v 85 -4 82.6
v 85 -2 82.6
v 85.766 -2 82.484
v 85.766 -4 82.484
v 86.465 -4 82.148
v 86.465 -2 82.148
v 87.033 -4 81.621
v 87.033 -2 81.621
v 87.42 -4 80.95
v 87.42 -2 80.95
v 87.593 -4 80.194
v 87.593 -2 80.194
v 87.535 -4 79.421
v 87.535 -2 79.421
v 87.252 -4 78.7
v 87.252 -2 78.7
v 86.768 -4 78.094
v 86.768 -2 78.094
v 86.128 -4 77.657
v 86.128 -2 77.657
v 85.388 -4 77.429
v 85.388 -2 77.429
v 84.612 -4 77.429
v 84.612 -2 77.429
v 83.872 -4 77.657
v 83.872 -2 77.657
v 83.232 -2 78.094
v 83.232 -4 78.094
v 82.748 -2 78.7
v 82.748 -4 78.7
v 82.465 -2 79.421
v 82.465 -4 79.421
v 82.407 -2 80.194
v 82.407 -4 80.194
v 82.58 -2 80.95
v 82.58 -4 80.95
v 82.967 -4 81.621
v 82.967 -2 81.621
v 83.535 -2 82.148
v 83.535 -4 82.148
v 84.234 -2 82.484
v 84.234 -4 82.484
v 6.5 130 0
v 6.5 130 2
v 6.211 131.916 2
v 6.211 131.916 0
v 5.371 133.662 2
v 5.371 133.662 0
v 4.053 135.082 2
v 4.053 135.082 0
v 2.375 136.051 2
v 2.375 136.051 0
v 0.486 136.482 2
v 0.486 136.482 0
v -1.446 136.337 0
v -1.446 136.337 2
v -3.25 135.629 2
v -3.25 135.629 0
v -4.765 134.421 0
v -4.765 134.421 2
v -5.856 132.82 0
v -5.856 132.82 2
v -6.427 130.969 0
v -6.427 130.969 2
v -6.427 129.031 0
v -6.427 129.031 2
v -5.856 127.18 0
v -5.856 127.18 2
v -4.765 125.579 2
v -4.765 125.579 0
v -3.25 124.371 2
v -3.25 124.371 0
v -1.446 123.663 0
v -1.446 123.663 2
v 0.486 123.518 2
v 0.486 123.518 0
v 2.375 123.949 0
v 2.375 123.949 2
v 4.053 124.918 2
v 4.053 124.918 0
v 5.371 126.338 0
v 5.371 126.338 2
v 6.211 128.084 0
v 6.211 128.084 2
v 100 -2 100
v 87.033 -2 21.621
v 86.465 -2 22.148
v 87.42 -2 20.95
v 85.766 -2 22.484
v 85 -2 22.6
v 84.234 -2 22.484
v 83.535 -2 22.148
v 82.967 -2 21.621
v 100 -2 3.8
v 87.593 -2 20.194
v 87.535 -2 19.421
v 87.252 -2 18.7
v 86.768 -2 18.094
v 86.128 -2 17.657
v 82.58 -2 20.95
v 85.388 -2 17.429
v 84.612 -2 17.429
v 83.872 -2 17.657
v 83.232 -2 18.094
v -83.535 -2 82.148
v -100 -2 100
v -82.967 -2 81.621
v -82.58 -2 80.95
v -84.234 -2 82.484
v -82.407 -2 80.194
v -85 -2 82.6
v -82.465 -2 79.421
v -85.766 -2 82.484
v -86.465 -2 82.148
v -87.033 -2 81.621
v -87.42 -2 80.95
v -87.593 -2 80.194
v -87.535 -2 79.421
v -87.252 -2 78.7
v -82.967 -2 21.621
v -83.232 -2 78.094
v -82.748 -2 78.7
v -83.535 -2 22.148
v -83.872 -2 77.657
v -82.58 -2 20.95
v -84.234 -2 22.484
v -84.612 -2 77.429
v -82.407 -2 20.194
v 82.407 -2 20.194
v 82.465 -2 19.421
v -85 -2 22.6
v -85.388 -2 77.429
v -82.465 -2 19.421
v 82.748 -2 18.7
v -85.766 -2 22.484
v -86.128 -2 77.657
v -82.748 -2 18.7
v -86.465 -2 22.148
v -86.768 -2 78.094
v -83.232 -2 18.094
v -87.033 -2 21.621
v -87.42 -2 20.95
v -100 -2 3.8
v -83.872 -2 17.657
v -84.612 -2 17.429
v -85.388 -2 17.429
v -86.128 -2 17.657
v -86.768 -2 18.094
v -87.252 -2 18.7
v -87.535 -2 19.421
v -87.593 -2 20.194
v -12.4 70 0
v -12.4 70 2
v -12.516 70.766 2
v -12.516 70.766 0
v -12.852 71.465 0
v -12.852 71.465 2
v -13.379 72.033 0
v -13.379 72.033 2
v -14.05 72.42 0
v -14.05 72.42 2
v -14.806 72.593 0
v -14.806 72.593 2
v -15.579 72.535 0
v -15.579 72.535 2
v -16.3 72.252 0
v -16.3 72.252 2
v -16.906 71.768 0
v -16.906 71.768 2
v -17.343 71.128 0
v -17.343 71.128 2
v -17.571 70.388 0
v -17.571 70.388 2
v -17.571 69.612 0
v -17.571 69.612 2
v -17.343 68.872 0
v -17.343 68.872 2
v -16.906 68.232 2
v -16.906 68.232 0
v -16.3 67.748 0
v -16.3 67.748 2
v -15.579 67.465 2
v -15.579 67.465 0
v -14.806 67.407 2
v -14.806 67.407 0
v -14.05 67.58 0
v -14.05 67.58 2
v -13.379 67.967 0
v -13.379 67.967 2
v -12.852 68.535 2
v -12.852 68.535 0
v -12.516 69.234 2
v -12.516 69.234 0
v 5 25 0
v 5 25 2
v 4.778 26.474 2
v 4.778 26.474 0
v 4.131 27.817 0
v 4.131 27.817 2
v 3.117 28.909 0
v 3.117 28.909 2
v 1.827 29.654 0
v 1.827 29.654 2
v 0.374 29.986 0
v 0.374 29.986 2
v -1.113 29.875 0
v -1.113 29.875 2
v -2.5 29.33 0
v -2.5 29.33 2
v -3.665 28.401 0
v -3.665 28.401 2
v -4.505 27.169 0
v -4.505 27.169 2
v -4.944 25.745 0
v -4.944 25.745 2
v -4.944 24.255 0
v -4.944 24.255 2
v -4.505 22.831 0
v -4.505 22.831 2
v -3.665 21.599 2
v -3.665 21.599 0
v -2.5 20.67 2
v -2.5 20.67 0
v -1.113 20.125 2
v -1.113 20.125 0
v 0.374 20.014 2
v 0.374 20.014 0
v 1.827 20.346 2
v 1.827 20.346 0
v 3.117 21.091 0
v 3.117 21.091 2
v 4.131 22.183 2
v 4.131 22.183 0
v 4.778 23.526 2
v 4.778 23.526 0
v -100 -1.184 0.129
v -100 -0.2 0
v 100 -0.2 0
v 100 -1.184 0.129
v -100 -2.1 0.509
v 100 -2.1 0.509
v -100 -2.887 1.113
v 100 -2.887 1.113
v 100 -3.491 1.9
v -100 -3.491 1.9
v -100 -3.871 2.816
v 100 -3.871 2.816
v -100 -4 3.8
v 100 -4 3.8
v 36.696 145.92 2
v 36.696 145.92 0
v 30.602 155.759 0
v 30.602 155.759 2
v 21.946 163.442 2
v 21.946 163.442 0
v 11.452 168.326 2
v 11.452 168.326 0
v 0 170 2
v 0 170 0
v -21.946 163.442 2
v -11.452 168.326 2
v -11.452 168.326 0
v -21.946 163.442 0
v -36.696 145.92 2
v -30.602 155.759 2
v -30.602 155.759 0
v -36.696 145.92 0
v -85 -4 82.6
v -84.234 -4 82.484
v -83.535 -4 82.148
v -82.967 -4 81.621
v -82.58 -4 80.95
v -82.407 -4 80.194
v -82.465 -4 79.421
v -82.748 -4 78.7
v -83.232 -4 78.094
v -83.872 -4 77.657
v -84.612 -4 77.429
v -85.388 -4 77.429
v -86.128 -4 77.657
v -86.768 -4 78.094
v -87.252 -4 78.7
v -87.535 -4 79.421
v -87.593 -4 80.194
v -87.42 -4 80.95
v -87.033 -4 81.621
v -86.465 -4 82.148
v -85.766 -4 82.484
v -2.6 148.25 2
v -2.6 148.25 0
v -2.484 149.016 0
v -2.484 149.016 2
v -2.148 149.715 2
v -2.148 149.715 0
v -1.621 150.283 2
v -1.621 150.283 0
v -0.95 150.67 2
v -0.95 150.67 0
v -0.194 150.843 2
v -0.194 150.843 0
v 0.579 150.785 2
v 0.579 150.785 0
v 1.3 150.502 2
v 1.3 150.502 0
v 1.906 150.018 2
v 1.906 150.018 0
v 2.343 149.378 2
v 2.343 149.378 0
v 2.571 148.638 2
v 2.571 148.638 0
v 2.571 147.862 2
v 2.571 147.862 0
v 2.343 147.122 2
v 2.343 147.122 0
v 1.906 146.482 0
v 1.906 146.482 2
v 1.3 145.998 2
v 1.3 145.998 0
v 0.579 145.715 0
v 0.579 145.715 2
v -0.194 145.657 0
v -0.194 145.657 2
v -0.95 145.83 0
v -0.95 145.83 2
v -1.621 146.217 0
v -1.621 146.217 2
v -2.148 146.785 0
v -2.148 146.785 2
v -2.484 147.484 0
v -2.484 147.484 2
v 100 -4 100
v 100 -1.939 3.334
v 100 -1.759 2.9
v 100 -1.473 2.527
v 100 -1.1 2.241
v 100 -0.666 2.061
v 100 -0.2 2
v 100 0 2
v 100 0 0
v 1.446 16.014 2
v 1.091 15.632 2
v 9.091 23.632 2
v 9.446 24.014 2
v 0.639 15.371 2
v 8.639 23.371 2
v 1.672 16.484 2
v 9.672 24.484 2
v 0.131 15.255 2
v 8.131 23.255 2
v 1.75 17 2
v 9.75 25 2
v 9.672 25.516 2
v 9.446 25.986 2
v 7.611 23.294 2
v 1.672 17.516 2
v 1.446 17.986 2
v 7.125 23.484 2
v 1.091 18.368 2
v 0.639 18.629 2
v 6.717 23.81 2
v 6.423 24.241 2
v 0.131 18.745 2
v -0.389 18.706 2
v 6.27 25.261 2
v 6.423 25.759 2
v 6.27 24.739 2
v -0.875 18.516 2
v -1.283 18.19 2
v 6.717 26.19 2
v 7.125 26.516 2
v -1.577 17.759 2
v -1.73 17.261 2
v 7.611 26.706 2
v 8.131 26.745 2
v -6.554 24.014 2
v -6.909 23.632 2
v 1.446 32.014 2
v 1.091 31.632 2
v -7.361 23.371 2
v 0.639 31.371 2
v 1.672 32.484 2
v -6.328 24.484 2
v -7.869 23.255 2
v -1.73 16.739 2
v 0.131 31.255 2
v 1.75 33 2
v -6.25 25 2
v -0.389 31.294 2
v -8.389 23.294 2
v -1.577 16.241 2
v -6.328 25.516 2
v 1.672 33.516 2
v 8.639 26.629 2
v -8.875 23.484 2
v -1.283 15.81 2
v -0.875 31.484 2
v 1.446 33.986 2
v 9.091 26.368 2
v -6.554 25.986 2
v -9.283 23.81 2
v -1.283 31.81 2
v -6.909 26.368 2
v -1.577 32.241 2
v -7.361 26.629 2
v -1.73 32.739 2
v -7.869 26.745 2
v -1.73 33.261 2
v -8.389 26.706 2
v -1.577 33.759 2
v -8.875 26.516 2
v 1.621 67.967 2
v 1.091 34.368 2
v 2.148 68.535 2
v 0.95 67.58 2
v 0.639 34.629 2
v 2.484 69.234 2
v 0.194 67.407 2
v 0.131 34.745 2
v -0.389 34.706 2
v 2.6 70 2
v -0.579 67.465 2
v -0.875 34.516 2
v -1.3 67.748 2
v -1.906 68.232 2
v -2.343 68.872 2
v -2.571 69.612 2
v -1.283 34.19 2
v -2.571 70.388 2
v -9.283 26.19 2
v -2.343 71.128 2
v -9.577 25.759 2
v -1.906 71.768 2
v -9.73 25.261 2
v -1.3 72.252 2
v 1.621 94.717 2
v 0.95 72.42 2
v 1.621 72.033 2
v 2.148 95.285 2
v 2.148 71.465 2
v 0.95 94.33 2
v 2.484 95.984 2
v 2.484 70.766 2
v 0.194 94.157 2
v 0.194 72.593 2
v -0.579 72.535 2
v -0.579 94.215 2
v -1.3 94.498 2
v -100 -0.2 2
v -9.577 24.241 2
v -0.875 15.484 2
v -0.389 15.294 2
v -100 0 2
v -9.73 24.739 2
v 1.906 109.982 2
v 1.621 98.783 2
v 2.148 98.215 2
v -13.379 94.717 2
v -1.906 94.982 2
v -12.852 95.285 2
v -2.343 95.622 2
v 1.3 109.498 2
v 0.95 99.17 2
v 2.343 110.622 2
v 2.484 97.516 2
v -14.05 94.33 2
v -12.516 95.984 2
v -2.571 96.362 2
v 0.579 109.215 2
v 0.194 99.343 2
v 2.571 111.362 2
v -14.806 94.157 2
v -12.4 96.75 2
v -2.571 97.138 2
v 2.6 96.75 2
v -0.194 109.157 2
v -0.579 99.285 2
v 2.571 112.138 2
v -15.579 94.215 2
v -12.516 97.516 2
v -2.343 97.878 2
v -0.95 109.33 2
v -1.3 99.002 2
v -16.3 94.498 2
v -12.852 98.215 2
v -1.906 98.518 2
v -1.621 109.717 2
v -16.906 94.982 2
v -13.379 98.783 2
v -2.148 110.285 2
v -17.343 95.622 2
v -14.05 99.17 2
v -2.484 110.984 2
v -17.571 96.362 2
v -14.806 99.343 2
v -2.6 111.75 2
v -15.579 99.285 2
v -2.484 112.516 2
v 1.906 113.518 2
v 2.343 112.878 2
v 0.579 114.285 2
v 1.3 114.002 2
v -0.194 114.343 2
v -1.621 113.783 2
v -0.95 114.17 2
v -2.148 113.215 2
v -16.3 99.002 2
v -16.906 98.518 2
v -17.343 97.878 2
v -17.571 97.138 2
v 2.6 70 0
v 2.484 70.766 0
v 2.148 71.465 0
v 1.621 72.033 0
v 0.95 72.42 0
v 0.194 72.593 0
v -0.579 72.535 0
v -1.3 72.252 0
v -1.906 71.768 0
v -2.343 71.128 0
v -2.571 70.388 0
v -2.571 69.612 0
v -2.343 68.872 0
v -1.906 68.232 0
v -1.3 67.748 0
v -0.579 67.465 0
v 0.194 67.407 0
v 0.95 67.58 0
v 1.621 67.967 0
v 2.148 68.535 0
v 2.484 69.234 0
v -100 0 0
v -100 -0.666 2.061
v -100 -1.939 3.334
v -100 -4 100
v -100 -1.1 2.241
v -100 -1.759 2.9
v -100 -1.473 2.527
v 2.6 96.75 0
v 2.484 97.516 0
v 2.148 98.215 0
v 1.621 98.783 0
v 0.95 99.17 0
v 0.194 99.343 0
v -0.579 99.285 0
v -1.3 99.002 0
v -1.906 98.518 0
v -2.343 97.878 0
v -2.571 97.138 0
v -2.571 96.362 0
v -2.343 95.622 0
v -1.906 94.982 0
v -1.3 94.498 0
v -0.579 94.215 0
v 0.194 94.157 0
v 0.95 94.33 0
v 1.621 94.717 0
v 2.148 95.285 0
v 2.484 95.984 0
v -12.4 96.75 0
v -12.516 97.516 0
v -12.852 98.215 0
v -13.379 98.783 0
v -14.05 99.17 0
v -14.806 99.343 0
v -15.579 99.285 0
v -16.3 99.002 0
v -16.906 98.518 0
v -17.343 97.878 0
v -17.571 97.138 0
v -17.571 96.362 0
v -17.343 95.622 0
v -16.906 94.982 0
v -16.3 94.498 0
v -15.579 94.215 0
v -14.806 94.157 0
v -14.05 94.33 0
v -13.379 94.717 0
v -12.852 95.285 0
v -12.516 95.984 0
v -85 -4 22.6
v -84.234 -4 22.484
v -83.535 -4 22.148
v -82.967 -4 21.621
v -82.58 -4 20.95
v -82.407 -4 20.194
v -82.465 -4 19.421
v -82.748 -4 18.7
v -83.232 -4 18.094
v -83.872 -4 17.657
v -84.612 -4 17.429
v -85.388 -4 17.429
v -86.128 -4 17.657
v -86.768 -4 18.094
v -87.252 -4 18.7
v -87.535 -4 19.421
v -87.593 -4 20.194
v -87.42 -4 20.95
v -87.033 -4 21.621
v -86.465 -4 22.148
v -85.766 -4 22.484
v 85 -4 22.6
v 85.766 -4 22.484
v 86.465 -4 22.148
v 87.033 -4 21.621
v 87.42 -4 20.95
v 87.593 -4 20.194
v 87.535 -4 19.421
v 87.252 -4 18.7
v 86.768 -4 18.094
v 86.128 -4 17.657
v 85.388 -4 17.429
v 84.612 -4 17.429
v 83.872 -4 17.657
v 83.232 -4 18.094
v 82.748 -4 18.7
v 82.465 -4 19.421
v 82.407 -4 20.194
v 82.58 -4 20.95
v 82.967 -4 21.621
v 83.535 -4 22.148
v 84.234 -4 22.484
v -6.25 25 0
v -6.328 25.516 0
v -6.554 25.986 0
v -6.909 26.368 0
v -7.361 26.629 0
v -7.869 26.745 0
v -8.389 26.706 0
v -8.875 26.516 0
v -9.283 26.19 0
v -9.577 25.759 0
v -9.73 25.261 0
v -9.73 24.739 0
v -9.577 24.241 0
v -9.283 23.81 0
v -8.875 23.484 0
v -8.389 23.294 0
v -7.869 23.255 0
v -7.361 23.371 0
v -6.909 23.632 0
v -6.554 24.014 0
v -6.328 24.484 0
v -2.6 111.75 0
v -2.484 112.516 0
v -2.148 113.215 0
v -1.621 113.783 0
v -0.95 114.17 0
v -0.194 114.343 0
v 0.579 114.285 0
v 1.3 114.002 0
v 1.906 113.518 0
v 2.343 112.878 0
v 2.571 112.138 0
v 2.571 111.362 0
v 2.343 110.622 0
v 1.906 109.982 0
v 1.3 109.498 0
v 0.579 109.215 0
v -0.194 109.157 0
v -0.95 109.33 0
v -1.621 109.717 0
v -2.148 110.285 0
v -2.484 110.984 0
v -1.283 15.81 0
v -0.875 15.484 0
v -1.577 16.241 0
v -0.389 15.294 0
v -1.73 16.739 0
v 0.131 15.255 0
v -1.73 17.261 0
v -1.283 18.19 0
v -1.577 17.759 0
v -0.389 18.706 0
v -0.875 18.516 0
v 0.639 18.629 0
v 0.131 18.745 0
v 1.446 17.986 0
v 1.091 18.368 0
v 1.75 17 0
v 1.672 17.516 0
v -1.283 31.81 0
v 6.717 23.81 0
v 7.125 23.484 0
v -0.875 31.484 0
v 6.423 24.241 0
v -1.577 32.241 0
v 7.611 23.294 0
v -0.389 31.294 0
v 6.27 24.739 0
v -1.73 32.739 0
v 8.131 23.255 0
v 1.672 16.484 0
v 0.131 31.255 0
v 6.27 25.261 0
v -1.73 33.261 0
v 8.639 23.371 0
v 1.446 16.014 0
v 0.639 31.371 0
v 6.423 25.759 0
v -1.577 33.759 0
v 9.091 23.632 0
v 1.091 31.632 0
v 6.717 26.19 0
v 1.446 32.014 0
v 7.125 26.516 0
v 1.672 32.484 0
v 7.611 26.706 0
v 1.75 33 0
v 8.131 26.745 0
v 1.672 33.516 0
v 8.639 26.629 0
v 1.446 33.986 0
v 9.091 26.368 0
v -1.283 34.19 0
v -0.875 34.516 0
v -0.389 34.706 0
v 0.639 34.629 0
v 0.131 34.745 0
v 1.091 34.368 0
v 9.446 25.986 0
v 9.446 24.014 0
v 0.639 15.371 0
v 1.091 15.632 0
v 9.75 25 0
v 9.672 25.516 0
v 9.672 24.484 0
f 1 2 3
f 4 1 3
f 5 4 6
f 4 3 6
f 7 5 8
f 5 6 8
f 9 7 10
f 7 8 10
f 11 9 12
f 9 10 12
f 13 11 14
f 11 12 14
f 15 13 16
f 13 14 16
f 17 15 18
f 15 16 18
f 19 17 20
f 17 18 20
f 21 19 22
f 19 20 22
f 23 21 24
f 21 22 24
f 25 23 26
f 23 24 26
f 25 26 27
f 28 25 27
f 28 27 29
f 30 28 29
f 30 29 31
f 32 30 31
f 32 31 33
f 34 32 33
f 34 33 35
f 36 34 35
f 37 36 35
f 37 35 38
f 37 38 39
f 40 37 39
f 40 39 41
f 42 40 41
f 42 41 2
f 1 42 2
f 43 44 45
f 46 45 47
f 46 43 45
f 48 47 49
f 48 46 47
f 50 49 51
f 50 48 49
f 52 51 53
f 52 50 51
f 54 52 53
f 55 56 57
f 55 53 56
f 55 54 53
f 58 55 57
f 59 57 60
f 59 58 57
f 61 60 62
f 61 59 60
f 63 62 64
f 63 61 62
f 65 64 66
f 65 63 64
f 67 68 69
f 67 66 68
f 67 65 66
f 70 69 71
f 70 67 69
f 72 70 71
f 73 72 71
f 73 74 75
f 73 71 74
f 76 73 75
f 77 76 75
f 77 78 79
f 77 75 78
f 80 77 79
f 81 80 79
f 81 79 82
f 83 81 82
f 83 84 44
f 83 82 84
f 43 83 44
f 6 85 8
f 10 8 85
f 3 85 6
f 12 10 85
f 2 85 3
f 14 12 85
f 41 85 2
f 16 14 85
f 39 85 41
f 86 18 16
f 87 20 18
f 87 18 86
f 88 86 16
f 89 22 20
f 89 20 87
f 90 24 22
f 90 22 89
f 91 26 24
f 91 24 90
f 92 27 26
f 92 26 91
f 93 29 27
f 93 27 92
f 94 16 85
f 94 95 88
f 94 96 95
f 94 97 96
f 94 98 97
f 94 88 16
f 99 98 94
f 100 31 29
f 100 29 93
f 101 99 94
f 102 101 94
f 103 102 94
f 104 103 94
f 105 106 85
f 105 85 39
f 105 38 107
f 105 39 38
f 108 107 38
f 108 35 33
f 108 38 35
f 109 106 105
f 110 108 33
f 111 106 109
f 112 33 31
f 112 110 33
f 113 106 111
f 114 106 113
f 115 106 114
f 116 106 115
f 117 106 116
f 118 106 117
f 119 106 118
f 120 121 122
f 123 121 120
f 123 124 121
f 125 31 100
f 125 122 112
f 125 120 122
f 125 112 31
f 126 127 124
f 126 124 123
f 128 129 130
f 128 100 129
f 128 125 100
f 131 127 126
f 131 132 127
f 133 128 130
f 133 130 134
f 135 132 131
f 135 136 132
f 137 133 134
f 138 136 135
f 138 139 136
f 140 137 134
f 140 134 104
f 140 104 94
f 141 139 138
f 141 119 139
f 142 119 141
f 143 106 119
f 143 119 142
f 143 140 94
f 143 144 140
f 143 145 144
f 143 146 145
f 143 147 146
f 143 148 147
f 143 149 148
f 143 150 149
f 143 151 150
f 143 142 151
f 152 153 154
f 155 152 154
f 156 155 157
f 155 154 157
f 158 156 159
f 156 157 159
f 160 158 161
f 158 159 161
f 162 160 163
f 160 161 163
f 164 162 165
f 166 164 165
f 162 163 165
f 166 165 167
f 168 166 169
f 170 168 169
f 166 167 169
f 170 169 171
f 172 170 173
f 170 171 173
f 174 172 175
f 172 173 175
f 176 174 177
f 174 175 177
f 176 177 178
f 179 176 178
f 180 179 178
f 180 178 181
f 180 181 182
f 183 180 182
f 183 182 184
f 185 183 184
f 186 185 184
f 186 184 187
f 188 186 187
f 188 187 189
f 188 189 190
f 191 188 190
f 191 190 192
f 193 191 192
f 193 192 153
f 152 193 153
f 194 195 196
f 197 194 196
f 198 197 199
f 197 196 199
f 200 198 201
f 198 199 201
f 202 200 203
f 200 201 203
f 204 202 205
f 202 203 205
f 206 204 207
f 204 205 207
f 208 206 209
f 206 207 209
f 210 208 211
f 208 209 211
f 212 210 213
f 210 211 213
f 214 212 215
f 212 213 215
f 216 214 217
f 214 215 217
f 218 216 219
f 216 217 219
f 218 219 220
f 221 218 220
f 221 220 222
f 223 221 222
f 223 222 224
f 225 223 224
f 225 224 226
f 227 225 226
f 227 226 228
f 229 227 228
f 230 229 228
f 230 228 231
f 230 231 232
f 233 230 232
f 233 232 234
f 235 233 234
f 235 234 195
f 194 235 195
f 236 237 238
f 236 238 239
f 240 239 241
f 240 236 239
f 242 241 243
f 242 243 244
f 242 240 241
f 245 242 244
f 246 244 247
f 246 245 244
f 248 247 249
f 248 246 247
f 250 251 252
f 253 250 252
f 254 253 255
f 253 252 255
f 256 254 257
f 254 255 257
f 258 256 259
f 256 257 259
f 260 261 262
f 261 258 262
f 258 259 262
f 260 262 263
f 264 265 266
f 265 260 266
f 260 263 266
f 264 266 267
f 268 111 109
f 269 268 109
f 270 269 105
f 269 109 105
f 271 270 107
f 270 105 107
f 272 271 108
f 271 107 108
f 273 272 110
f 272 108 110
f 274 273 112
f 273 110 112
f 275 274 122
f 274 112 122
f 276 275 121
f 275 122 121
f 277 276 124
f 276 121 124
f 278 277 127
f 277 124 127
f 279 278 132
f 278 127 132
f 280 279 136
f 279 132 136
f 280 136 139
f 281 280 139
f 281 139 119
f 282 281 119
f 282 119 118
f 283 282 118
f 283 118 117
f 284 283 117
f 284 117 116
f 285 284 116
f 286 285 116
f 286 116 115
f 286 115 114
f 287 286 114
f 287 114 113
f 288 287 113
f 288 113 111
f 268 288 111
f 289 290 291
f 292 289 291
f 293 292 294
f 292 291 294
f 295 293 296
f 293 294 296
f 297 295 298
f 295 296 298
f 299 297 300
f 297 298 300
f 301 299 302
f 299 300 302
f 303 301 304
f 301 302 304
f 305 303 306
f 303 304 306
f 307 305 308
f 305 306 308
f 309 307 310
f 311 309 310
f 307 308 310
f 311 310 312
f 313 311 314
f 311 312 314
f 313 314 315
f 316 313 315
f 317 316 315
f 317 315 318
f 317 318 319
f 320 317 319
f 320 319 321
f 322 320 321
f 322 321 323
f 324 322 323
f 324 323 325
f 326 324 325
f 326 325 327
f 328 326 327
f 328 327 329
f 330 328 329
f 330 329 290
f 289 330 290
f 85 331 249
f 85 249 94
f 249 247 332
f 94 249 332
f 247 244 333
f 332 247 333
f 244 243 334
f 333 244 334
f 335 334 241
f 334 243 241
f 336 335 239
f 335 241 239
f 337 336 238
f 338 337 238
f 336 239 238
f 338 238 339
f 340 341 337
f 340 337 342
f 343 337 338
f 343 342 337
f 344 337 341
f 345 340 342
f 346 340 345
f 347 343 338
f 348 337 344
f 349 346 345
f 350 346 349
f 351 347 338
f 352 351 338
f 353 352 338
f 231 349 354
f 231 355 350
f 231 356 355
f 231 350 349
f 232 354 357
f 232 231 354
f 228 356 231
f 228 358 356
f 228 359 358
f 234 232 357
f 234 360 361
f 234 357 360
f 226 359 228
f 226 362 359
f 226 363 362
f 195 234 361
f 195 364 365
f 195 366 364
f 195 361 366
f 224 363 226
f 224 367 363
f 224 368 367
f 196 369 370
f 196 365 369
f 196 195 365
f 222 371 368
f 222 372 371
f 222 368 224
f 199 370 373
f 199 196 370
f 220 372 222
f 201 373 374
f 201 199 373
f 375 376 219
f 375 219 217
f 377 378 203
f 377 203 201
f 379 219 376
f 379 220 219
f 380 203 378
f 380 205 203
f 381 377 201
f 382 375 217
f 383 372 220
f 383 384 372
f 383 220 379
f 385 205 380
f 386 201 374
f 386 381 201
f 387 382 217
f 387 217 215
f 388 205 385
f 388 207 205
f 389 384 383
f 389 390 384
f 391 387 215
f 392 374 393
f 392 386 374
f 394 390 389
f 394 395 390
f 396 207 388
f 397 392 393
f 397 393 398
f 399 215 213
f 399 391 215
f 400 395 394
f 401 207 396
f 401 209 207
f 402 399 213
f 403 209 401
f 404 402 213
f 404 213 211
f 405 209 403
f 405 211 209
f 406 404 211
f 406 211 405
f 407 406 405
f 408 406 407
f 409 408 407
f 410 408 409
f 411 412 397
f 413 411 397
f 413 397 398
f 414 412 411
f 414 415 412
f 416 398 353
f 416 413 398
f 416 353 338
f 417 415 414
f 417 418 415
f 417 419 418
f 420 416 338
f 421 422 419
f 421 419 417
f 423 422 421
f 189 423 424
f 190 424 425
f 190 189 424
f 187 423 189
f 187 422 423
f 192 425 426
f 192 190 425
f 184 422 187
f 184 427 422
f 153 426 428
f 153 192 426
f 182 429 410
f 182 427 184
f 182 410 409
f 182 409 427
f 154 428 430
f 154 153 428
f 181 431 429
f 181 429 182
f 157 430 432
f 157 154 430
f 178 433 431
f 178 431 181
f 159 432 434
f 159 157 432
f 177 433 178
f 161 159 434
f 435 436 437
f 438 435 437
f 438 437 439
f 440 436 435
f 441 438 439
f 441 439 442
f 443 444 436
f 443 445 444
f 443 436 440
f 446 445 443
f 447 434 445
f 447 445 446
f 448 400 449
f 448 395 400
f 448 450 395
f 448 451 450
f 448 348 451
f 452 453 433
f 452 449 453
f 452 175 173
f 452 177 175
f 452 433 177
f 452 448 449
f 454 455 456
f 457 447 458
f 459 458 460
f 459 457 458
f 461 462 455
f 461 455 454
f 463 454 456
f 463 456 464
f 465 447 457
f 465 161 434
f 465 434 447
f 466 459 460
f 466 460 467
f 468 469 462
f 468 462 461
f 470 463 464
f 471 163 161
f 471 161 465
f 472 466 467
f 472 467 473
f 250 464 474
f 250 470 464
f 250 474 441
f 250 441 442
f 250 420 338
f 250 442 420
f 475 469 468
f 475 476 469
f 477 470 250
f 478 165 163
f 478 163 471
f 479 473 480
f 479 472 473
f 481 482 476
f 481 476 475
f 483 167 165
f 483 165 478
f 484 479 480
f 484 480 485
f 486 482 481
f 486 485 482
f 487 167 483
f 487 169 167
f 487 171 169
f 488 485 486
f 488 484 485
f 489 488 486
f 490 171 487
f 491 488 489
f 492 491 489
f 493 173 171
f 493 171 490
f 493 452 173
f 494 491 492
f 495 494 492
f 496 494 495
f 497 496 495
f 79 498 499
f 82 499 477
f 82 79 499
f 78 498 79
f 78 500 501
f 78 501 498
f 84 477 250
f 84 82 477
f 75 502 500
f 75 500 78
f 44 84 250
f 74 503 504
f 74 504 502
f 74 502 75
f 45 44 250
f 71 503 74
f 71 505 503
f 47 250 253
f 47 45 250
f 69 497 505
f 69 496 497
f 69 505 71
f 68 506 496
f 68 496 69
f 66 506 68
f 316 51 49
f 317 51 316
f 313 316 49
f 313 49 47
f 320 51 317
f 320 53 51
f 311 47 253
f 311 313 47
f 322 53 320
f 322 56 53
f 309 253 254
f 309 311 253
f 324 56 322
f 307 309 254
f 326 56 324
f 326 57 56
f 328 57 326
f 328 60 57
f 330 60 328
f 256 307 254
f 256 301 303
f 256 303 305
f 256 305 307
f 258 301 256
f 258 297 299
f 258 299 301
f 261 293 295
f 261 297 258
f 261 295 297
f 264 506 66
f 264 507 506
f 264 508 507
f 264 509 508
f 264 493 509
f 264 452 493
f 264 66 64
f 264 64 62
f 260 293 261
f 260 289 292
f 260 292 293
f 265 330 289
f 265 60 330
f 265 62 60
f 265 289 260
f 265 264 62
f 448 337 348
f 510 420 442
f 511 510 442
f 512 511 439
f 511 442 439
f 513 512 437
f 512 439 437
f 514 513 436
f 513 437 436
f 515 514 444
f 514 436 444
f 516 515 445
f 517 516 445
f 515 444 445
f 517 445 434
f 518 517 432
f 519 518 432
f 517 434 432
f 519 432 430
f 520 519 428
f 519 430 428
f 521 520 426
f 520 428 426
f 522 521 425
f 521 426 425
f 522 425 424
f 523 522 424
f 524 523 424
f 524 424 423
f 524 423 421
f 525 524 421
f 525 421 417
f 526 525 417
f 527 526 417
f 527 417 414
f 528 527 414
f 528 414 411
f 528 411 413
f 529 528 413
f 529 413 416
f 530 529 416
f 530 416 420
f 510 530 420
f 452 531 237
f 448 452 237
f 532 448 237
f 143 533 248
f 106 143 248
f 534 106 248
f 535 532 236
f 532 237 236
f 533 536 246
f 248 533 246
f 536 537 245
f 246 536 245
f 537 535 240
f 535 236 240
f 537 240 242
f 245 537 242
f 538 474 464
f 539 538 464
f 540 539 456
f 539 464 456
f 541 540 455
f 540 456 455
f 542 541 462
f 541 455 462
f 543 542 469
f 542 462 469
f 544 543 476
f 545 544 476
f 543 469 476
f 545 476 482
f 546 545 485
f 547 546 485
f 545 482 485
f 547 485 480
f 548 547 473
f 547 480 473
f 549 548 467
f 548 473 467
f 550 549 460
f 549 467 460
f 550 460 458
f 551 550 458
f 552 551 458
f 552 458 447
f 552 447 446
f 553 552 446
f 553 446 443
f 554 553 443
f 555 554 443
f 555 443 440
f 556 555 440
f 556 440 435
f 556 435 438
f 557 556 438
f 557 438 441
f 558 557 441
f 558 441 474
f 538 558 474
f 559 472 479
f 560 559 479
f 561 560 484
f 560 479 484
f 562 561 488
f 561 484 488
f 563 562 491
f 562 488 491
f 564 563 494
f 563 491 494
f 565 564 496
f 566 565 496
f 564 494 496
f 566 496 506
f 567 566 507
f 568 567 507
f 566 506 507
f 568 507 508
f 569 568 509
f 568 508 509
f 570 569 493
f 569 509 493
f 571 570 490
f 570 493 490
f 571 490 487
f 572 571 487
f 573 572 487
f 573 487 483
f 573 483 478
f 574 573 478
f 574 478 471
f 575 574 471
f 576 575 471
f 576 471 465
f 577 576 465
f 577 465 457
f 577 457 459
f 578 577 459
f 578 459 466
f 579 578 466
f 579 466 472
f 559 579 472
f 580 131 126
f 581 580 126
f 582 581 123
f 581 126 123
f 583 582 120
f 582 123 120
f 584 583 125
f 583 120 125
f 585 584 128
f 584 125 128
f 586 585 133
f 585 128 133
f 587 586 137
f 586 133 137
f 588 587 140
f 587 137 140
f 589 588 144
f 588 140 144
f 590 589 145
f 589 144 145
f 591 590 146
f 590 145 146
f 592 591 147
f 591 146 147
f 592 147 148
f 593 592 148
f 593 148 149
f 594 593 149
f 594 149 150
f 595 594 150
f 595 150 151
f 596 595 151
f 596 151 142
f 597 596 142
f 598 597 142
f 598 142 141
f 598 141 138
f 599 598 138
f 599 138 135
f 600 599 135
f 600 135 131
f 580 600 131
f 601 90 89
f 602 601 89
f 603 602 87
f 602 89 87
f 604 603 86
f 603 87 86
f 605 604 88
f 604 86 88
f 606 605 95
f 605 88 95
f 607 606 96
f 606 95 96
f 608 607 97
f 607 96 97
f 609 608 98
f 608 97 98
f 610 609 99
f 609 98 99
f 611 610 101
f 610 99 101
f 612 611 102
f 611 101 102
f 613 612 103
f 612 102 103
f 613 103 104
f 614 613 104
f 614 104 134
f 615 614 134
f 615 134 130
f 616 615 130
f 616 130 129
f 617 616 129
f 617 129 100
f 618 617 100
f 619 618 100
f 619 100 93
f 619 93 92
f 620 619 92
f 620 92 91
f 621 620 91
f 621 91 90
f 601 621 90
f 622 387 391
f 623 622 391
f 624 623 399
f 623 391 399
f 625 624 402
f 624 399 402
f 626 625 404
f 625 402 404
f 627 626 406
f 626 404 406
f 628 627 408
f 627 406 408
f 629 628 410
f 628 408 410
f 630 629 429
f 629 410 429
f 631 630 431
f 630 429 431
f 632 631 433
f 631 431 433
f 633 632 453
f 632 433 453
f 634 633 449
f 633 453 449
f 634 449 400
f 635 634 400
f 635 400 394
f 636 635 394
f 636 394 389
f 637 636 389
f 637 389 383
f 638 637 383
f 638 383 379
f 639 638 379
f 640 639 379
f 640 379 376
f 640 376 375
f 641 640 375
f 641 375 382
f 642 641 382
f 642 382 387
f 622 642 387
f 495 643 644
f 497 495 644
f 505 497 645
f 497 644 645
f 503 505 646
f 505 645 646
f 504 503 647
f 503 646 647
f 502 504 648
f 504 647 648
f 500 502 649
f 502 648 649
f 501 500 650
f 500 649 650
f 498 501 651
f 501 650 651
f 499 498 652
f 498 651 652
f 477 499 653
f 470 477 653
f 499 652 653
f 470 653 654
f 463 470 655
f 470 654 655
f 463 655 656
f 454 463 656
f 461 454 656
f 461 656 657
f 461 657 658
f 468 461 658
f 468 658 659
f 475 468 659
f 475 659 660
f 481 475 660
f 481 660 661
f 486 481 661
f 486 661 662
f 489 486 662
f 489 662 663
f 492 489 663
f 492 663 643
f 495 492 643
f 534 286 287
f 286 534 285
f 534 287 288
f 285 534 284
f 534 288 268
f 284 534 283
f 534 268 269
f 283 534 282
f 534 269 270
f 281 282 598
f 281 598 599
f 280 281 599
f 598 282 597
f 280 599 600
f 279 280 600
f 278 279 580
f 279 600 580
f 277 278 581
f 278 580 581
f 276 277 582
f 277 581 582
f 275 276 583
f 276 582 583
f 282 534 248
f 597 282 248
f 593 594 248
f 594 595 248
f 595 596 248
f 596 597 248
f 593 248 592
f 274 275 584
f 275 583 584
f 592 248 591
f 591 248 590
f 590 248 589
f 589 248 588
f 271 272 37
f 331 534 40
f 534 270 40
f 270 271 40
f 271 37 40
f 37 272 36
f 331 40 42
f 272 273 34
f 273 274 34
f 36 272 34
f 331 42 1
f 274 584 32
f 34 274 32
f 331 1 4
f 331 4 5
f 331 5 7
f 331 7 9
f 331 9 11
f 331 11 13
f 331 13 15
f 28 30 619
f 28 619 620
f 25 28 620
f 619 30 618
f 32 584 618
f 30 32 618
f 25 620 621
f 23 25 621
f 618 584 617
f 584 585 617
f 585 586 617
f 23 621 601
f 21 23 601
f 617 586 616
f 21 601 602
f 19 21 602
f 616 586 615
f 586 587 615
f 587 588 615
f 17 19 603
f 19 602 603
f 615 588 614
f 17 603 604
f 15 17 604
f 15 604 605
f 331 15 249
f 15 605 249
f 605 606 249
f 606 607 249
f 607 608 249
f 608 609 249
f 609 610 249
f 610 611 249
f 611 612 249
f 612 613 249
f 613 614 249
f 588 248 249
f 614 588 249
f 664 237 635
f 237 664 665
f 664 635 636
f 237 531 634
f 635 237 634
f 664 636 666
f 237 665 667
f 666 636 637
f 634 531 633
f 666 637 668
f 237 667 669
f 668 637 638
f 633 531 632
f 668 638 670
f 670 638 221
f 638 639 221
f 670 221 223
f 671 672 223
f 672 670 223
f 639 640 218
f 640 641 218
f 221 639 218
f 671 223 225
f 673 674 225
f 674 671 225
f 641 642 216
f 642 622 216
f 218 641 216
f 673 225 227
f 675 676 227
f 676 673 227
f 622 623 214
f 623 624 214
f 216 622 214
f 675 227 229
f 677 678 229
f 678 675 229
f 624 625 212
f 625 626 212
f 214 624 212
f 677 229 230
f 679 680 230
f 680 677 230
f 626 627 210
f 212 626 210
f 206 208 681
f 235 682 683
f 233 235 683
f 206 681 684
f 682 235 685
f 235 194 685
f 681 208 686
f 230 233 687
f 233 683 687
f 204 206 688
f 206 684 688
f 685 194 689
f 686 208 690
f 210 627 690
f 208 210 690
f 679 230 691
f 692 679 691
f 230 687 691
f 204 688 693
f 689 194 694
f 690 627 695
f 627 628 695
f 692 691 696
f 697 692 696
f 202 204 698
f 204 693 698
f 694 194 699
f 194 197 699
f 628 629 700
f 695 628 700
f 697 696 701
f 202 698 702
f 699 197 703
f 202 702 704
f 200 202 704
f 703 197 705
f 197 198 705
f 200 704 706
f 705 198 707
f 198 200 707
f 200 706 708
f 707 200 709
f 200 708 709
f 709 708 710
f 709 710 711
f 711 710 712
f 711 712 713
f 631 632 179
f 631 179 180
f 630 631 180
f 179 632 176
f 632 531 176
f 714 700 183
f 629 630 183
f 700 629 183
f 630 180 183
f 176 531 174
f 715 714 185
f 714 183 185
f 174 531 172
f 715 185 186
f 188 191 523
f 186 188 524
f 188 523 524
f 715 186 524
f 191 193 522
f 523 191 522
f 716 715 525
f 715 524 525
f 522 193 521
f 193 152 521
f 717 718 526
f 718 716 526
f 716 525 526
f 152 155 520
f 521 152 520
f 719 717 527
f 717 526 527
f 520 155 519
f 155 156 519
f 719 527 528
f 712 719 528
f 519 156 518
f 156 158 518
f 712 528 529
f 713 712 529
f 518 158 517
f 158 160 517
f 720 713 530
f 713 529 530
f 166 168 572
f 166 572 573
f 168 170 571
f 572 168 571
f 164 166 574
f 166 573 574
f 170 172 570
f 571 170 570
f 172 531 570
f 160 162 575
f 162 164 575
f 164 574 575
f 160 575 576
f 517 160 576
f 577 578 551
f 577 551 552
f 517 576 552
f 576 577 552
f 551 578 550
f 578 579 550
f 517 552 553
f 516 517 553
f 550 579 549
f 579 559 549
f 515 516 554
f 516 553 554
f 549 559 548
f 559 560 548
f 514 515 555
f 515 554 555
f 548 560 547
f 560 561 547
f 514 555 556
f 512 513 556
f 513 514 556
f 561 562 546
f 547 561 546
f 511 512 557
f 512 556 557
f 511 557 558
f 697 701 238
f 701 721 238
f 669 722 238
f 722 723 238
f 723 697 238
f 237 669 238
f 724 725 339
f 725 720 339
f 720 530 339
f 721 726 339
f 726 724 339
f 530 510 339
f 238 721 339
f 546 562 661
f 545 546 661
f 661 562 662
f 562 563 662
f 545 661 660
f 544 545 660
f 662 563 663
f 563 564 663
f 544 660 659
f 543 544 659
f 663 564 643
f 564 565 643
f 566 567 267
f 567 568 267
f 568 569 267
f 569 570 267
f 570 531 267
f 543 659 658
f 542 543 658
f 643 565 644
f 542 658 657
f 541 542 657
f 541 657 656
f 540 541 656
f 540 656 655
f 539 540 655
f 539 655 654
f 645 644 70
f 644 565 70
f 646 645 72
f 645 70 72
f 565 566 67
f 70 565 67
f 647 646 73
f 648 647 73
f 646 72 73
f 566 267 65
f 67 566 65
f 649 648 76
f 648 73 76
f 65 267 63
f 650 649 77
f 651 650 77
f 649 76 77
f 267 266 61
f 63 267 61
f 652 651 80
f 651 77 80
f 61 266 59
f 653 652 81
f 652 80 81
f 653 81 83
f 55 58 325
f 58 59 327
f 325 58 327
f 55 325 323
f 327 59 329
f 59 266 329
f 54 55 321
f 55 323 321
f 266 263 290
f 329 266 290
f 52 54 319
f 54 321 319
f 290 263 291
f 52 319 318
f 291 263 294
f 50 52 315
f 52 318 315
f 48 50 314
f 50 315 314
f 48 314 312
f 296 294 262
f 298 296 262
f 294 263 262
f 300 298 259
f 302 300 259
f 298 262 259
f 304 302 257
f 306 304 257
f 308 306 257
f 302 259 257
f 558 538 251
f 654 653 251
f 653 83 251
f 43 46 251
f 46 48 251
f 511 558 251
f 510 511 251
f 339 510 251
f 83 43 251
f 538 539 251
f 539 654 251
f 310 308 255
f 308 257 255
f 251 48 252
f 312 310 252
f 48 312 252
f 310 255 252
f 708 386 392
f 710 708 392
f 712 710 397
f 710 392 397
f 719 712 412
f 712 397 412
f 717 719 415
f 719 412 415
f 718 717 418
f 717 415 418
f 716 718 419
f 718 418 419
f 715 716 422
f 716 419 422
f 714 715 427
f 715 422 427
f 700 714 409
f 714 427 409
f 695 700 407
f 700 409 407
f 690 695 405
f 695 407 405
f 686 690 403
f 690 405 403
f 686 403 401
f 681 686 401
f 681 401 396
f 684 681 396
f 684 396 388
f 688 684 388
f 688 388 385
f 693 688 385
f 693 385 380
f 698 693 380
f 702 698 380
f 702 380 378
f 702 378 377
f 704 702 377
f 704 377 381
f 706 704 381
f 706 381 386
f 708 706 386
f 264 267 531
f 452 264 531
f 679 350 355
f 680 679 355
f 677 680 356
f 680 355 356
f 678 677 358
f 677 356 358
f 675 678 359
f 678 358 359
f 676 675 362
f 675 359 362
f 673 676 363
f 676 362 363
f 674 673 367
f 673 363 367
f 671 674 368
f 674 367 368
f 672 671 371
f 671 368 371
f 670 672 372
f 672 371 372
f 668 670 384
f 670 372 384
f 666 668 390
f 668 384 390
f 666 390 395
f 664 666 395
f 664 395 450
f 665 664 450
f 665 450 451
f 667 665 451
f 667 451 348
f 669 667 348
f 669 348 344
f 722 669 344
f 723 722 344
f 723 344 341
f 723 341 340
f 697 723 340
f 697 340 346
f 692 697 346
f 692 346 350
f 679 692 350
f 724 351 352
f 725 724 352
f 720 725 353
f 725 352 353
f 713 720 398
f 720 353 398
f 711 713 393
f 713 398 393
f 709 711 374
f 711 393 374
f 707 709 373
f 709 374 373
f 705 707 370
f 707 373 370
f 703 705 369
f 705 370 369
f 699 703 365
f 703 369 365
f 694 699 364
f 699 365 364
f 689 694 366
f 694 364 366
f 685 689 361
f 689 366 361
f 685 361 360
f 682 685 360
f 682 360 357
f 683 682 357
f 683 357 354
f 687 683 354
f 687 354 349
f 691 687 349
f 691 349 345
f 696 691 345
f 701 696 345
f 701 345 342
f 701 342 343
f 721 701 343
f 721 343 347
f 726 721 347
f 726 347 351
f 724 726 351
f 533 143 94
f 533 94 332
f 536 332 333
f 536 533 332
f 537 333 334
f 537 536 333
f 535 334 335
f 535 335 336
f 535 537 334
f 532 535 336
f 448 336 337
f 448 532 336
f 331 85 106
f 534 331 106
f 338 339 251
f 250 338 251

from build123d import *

# Parameters (mm, degrees)
SKETCH1_R            = 6.5
BOSS_EXTRUDE1_DEPTH  = 4
SKETCH4_R            = 2.6
CUT_EXTRUDE1_DEPTH   = 10
SKETCH5_W            = 200
SKETCH5_H            = 4
BOSS_EXTRUDE2_DEPTH  = 100
SKETCH8_R            = 2.6
CUT_EXTRUDE2_DEPTH   = 100
SKETCH9_R            = 5
SKETCH9_R_2          = 1.75
CUT_EXTRUDE3_DEPTH   = 10
CONVERT_SOLID3_START = -100
CONVERT_SOLID3_DEPTH = 200
SKETCH11_R           = 2.6
CUT_EXTRUDE4_DEPTH   = 10


# Read off the part's stored shape, not the designer's step: Convert-Solid3
with BuildPart() as part:
    # Sketch1 → Boss-Extrude1 (new body)
    with BuildSketch(Plane.XY):
        with BuildLine():
            Line((100, -4), (100, 0))
            Line((100, 0), (36.695562583, 145.919663525))
            ThreePointArc((36.695562583, 145.919663525), (0, 170), (-36.695562583, 145.919663525))
            Line((-36.695562583, 145.919663525), (-100, 0))
            Line((-100, 0), (-100, -4))
            Line((-100, -4), (100, -4))
        make_face()
        with Locations((0, 130)):
            Circle(SKETCH1_R, mode=Mode.SUBTRACT)
    extrude(amount=BOSS_EXTRUDE1_DEPTH)

    # Sketch4 → Cut-Extrude1 (cut)
    with BuildSketch(Plane(origin=(0, 0, 0), x_dir=(-1, 0, 0), z_dir=(0, 0, -1))):
        with Locations((0, 111.75)):
            Circle(SKETCH4_R)
        with Locations((0, 148.25)):
            Circle(SKETCH4_R)
    extrude(amount=-CUT_EXTRUDE1_DEPTH, mode=Mode.SUBTRACT)

    # Sketch5 → Boss-Extrude2 (add)
    with BuildSketch(Plane(origin=(0, 0, 0), x_dir=(-1, 0, 0), z_dir=(0, 0, -1))):
        with Locations((0, -2)):
            Rectangle(SKETCH5_W, SKETCH5_H)
    extrude(amount=-BOSS_EXTRUDE2_DEPTH)

    # Sketch8 → Cut-Extrude2 (cut)
    with BuildSketch(Plane(origin=(0, 0, 0), x_dir=(1, 0, 0), z_dir=(0, 1, 0))):
        with Locations(Location((-85, -80, 0), (0, 0, 270))):
            Circle(SKETCH8_R)
        with Locations(Location((-85, -20, 0), (0, 0, 270))):
            Circle(SKETCH8_R)
        with Locations(Location((85, -80, 0), (0, 0, 270))):
            Circle(SKETCH8_R)
        with Locations(Location((85, -20, 0), (0, 0, 270))):
            Circle(SKETCH8_R)
    extrude(amount=-CUT_EXTRUDE2_DEPTH, mode=Mode.SUBTRACT)

    # Sketch9 → Cut-Extrude3 (cut)
    with BuildSketch(Plane.XY.offset(4)):
        with Locations((0, 25)):
            Circle(SKETCH9_R)
        with Locations((0, 33)):
            Circle(SKETCH9_R_2)
        with Locations((0, 17)):
            Circle(SKETCH9_R_2)
        with Locations((8, 25)):
            Circle(SKETCH9_R_2)
        with Locations((-8, 25)):
            Circle(SKETCH9_R_2)
    extrude(amount=-CUT_EXTRUDE3_DEPTH, mode=Mode.SUBTRACT)

    # Convert-Solid3 outline → Convert-Solid3 (cut)
    with BuildSketch(Plane.YZ.offset(CONVERT_SOLID3_START)):
        with BuildLine():
            ThreePointArc((-0.2, 0), (-2.887005769, 1.112994231), (-4, 3.8))
            Line((-4, 3.8), (-3.999999957, 100))
            Line((-3.999999957, 100), (-6, 100))
            Line((-6, 100), (-6, -1))
            Line((-6, -1), (171, -1))
            Line((171, -1), (171, 7.6e-08))
            Line((171, 7.6e-08), (-0.2, 0))
        make_face()
        with BuildLine():
            Line((0, 100), (-2, 100))
            Line((-2, 100), (-2, 3.8))
            ThreePointArc((-2, 3.8), (-1.472792206, 2.527207794), (-0.2, 2))
            Line((-0.2, 2), (171, 2))
            Line((171, 2), (171, 4))
            Line((171, 4), (0, 4))
            Line((0, 4), (0, 100))
        make_face()
    extrude(amount=CONVERT_SOLID3_DEPTH, mode=Mode.SUBTRACT)

    # Sketch11 → Cut-Extrude4 (cut)
    with BuildSketch(Plane.XY.offset(2)):
        with Locations((0, 70)):
            Circle(SKETCH11_R)
        with Locations((0, 96.75)):
            Circle(SKETCH11_R)
        with Locations((-15, 96.75)):
            Circle(SKETCH11_R)
        with Locations((-15, 70)):
            Circle(SKETCH11_R)
    extrude(amount=-CUT_EXTRUDE4_DEPTH, mode=Mode.SUBTRACT)


solid = part.part
